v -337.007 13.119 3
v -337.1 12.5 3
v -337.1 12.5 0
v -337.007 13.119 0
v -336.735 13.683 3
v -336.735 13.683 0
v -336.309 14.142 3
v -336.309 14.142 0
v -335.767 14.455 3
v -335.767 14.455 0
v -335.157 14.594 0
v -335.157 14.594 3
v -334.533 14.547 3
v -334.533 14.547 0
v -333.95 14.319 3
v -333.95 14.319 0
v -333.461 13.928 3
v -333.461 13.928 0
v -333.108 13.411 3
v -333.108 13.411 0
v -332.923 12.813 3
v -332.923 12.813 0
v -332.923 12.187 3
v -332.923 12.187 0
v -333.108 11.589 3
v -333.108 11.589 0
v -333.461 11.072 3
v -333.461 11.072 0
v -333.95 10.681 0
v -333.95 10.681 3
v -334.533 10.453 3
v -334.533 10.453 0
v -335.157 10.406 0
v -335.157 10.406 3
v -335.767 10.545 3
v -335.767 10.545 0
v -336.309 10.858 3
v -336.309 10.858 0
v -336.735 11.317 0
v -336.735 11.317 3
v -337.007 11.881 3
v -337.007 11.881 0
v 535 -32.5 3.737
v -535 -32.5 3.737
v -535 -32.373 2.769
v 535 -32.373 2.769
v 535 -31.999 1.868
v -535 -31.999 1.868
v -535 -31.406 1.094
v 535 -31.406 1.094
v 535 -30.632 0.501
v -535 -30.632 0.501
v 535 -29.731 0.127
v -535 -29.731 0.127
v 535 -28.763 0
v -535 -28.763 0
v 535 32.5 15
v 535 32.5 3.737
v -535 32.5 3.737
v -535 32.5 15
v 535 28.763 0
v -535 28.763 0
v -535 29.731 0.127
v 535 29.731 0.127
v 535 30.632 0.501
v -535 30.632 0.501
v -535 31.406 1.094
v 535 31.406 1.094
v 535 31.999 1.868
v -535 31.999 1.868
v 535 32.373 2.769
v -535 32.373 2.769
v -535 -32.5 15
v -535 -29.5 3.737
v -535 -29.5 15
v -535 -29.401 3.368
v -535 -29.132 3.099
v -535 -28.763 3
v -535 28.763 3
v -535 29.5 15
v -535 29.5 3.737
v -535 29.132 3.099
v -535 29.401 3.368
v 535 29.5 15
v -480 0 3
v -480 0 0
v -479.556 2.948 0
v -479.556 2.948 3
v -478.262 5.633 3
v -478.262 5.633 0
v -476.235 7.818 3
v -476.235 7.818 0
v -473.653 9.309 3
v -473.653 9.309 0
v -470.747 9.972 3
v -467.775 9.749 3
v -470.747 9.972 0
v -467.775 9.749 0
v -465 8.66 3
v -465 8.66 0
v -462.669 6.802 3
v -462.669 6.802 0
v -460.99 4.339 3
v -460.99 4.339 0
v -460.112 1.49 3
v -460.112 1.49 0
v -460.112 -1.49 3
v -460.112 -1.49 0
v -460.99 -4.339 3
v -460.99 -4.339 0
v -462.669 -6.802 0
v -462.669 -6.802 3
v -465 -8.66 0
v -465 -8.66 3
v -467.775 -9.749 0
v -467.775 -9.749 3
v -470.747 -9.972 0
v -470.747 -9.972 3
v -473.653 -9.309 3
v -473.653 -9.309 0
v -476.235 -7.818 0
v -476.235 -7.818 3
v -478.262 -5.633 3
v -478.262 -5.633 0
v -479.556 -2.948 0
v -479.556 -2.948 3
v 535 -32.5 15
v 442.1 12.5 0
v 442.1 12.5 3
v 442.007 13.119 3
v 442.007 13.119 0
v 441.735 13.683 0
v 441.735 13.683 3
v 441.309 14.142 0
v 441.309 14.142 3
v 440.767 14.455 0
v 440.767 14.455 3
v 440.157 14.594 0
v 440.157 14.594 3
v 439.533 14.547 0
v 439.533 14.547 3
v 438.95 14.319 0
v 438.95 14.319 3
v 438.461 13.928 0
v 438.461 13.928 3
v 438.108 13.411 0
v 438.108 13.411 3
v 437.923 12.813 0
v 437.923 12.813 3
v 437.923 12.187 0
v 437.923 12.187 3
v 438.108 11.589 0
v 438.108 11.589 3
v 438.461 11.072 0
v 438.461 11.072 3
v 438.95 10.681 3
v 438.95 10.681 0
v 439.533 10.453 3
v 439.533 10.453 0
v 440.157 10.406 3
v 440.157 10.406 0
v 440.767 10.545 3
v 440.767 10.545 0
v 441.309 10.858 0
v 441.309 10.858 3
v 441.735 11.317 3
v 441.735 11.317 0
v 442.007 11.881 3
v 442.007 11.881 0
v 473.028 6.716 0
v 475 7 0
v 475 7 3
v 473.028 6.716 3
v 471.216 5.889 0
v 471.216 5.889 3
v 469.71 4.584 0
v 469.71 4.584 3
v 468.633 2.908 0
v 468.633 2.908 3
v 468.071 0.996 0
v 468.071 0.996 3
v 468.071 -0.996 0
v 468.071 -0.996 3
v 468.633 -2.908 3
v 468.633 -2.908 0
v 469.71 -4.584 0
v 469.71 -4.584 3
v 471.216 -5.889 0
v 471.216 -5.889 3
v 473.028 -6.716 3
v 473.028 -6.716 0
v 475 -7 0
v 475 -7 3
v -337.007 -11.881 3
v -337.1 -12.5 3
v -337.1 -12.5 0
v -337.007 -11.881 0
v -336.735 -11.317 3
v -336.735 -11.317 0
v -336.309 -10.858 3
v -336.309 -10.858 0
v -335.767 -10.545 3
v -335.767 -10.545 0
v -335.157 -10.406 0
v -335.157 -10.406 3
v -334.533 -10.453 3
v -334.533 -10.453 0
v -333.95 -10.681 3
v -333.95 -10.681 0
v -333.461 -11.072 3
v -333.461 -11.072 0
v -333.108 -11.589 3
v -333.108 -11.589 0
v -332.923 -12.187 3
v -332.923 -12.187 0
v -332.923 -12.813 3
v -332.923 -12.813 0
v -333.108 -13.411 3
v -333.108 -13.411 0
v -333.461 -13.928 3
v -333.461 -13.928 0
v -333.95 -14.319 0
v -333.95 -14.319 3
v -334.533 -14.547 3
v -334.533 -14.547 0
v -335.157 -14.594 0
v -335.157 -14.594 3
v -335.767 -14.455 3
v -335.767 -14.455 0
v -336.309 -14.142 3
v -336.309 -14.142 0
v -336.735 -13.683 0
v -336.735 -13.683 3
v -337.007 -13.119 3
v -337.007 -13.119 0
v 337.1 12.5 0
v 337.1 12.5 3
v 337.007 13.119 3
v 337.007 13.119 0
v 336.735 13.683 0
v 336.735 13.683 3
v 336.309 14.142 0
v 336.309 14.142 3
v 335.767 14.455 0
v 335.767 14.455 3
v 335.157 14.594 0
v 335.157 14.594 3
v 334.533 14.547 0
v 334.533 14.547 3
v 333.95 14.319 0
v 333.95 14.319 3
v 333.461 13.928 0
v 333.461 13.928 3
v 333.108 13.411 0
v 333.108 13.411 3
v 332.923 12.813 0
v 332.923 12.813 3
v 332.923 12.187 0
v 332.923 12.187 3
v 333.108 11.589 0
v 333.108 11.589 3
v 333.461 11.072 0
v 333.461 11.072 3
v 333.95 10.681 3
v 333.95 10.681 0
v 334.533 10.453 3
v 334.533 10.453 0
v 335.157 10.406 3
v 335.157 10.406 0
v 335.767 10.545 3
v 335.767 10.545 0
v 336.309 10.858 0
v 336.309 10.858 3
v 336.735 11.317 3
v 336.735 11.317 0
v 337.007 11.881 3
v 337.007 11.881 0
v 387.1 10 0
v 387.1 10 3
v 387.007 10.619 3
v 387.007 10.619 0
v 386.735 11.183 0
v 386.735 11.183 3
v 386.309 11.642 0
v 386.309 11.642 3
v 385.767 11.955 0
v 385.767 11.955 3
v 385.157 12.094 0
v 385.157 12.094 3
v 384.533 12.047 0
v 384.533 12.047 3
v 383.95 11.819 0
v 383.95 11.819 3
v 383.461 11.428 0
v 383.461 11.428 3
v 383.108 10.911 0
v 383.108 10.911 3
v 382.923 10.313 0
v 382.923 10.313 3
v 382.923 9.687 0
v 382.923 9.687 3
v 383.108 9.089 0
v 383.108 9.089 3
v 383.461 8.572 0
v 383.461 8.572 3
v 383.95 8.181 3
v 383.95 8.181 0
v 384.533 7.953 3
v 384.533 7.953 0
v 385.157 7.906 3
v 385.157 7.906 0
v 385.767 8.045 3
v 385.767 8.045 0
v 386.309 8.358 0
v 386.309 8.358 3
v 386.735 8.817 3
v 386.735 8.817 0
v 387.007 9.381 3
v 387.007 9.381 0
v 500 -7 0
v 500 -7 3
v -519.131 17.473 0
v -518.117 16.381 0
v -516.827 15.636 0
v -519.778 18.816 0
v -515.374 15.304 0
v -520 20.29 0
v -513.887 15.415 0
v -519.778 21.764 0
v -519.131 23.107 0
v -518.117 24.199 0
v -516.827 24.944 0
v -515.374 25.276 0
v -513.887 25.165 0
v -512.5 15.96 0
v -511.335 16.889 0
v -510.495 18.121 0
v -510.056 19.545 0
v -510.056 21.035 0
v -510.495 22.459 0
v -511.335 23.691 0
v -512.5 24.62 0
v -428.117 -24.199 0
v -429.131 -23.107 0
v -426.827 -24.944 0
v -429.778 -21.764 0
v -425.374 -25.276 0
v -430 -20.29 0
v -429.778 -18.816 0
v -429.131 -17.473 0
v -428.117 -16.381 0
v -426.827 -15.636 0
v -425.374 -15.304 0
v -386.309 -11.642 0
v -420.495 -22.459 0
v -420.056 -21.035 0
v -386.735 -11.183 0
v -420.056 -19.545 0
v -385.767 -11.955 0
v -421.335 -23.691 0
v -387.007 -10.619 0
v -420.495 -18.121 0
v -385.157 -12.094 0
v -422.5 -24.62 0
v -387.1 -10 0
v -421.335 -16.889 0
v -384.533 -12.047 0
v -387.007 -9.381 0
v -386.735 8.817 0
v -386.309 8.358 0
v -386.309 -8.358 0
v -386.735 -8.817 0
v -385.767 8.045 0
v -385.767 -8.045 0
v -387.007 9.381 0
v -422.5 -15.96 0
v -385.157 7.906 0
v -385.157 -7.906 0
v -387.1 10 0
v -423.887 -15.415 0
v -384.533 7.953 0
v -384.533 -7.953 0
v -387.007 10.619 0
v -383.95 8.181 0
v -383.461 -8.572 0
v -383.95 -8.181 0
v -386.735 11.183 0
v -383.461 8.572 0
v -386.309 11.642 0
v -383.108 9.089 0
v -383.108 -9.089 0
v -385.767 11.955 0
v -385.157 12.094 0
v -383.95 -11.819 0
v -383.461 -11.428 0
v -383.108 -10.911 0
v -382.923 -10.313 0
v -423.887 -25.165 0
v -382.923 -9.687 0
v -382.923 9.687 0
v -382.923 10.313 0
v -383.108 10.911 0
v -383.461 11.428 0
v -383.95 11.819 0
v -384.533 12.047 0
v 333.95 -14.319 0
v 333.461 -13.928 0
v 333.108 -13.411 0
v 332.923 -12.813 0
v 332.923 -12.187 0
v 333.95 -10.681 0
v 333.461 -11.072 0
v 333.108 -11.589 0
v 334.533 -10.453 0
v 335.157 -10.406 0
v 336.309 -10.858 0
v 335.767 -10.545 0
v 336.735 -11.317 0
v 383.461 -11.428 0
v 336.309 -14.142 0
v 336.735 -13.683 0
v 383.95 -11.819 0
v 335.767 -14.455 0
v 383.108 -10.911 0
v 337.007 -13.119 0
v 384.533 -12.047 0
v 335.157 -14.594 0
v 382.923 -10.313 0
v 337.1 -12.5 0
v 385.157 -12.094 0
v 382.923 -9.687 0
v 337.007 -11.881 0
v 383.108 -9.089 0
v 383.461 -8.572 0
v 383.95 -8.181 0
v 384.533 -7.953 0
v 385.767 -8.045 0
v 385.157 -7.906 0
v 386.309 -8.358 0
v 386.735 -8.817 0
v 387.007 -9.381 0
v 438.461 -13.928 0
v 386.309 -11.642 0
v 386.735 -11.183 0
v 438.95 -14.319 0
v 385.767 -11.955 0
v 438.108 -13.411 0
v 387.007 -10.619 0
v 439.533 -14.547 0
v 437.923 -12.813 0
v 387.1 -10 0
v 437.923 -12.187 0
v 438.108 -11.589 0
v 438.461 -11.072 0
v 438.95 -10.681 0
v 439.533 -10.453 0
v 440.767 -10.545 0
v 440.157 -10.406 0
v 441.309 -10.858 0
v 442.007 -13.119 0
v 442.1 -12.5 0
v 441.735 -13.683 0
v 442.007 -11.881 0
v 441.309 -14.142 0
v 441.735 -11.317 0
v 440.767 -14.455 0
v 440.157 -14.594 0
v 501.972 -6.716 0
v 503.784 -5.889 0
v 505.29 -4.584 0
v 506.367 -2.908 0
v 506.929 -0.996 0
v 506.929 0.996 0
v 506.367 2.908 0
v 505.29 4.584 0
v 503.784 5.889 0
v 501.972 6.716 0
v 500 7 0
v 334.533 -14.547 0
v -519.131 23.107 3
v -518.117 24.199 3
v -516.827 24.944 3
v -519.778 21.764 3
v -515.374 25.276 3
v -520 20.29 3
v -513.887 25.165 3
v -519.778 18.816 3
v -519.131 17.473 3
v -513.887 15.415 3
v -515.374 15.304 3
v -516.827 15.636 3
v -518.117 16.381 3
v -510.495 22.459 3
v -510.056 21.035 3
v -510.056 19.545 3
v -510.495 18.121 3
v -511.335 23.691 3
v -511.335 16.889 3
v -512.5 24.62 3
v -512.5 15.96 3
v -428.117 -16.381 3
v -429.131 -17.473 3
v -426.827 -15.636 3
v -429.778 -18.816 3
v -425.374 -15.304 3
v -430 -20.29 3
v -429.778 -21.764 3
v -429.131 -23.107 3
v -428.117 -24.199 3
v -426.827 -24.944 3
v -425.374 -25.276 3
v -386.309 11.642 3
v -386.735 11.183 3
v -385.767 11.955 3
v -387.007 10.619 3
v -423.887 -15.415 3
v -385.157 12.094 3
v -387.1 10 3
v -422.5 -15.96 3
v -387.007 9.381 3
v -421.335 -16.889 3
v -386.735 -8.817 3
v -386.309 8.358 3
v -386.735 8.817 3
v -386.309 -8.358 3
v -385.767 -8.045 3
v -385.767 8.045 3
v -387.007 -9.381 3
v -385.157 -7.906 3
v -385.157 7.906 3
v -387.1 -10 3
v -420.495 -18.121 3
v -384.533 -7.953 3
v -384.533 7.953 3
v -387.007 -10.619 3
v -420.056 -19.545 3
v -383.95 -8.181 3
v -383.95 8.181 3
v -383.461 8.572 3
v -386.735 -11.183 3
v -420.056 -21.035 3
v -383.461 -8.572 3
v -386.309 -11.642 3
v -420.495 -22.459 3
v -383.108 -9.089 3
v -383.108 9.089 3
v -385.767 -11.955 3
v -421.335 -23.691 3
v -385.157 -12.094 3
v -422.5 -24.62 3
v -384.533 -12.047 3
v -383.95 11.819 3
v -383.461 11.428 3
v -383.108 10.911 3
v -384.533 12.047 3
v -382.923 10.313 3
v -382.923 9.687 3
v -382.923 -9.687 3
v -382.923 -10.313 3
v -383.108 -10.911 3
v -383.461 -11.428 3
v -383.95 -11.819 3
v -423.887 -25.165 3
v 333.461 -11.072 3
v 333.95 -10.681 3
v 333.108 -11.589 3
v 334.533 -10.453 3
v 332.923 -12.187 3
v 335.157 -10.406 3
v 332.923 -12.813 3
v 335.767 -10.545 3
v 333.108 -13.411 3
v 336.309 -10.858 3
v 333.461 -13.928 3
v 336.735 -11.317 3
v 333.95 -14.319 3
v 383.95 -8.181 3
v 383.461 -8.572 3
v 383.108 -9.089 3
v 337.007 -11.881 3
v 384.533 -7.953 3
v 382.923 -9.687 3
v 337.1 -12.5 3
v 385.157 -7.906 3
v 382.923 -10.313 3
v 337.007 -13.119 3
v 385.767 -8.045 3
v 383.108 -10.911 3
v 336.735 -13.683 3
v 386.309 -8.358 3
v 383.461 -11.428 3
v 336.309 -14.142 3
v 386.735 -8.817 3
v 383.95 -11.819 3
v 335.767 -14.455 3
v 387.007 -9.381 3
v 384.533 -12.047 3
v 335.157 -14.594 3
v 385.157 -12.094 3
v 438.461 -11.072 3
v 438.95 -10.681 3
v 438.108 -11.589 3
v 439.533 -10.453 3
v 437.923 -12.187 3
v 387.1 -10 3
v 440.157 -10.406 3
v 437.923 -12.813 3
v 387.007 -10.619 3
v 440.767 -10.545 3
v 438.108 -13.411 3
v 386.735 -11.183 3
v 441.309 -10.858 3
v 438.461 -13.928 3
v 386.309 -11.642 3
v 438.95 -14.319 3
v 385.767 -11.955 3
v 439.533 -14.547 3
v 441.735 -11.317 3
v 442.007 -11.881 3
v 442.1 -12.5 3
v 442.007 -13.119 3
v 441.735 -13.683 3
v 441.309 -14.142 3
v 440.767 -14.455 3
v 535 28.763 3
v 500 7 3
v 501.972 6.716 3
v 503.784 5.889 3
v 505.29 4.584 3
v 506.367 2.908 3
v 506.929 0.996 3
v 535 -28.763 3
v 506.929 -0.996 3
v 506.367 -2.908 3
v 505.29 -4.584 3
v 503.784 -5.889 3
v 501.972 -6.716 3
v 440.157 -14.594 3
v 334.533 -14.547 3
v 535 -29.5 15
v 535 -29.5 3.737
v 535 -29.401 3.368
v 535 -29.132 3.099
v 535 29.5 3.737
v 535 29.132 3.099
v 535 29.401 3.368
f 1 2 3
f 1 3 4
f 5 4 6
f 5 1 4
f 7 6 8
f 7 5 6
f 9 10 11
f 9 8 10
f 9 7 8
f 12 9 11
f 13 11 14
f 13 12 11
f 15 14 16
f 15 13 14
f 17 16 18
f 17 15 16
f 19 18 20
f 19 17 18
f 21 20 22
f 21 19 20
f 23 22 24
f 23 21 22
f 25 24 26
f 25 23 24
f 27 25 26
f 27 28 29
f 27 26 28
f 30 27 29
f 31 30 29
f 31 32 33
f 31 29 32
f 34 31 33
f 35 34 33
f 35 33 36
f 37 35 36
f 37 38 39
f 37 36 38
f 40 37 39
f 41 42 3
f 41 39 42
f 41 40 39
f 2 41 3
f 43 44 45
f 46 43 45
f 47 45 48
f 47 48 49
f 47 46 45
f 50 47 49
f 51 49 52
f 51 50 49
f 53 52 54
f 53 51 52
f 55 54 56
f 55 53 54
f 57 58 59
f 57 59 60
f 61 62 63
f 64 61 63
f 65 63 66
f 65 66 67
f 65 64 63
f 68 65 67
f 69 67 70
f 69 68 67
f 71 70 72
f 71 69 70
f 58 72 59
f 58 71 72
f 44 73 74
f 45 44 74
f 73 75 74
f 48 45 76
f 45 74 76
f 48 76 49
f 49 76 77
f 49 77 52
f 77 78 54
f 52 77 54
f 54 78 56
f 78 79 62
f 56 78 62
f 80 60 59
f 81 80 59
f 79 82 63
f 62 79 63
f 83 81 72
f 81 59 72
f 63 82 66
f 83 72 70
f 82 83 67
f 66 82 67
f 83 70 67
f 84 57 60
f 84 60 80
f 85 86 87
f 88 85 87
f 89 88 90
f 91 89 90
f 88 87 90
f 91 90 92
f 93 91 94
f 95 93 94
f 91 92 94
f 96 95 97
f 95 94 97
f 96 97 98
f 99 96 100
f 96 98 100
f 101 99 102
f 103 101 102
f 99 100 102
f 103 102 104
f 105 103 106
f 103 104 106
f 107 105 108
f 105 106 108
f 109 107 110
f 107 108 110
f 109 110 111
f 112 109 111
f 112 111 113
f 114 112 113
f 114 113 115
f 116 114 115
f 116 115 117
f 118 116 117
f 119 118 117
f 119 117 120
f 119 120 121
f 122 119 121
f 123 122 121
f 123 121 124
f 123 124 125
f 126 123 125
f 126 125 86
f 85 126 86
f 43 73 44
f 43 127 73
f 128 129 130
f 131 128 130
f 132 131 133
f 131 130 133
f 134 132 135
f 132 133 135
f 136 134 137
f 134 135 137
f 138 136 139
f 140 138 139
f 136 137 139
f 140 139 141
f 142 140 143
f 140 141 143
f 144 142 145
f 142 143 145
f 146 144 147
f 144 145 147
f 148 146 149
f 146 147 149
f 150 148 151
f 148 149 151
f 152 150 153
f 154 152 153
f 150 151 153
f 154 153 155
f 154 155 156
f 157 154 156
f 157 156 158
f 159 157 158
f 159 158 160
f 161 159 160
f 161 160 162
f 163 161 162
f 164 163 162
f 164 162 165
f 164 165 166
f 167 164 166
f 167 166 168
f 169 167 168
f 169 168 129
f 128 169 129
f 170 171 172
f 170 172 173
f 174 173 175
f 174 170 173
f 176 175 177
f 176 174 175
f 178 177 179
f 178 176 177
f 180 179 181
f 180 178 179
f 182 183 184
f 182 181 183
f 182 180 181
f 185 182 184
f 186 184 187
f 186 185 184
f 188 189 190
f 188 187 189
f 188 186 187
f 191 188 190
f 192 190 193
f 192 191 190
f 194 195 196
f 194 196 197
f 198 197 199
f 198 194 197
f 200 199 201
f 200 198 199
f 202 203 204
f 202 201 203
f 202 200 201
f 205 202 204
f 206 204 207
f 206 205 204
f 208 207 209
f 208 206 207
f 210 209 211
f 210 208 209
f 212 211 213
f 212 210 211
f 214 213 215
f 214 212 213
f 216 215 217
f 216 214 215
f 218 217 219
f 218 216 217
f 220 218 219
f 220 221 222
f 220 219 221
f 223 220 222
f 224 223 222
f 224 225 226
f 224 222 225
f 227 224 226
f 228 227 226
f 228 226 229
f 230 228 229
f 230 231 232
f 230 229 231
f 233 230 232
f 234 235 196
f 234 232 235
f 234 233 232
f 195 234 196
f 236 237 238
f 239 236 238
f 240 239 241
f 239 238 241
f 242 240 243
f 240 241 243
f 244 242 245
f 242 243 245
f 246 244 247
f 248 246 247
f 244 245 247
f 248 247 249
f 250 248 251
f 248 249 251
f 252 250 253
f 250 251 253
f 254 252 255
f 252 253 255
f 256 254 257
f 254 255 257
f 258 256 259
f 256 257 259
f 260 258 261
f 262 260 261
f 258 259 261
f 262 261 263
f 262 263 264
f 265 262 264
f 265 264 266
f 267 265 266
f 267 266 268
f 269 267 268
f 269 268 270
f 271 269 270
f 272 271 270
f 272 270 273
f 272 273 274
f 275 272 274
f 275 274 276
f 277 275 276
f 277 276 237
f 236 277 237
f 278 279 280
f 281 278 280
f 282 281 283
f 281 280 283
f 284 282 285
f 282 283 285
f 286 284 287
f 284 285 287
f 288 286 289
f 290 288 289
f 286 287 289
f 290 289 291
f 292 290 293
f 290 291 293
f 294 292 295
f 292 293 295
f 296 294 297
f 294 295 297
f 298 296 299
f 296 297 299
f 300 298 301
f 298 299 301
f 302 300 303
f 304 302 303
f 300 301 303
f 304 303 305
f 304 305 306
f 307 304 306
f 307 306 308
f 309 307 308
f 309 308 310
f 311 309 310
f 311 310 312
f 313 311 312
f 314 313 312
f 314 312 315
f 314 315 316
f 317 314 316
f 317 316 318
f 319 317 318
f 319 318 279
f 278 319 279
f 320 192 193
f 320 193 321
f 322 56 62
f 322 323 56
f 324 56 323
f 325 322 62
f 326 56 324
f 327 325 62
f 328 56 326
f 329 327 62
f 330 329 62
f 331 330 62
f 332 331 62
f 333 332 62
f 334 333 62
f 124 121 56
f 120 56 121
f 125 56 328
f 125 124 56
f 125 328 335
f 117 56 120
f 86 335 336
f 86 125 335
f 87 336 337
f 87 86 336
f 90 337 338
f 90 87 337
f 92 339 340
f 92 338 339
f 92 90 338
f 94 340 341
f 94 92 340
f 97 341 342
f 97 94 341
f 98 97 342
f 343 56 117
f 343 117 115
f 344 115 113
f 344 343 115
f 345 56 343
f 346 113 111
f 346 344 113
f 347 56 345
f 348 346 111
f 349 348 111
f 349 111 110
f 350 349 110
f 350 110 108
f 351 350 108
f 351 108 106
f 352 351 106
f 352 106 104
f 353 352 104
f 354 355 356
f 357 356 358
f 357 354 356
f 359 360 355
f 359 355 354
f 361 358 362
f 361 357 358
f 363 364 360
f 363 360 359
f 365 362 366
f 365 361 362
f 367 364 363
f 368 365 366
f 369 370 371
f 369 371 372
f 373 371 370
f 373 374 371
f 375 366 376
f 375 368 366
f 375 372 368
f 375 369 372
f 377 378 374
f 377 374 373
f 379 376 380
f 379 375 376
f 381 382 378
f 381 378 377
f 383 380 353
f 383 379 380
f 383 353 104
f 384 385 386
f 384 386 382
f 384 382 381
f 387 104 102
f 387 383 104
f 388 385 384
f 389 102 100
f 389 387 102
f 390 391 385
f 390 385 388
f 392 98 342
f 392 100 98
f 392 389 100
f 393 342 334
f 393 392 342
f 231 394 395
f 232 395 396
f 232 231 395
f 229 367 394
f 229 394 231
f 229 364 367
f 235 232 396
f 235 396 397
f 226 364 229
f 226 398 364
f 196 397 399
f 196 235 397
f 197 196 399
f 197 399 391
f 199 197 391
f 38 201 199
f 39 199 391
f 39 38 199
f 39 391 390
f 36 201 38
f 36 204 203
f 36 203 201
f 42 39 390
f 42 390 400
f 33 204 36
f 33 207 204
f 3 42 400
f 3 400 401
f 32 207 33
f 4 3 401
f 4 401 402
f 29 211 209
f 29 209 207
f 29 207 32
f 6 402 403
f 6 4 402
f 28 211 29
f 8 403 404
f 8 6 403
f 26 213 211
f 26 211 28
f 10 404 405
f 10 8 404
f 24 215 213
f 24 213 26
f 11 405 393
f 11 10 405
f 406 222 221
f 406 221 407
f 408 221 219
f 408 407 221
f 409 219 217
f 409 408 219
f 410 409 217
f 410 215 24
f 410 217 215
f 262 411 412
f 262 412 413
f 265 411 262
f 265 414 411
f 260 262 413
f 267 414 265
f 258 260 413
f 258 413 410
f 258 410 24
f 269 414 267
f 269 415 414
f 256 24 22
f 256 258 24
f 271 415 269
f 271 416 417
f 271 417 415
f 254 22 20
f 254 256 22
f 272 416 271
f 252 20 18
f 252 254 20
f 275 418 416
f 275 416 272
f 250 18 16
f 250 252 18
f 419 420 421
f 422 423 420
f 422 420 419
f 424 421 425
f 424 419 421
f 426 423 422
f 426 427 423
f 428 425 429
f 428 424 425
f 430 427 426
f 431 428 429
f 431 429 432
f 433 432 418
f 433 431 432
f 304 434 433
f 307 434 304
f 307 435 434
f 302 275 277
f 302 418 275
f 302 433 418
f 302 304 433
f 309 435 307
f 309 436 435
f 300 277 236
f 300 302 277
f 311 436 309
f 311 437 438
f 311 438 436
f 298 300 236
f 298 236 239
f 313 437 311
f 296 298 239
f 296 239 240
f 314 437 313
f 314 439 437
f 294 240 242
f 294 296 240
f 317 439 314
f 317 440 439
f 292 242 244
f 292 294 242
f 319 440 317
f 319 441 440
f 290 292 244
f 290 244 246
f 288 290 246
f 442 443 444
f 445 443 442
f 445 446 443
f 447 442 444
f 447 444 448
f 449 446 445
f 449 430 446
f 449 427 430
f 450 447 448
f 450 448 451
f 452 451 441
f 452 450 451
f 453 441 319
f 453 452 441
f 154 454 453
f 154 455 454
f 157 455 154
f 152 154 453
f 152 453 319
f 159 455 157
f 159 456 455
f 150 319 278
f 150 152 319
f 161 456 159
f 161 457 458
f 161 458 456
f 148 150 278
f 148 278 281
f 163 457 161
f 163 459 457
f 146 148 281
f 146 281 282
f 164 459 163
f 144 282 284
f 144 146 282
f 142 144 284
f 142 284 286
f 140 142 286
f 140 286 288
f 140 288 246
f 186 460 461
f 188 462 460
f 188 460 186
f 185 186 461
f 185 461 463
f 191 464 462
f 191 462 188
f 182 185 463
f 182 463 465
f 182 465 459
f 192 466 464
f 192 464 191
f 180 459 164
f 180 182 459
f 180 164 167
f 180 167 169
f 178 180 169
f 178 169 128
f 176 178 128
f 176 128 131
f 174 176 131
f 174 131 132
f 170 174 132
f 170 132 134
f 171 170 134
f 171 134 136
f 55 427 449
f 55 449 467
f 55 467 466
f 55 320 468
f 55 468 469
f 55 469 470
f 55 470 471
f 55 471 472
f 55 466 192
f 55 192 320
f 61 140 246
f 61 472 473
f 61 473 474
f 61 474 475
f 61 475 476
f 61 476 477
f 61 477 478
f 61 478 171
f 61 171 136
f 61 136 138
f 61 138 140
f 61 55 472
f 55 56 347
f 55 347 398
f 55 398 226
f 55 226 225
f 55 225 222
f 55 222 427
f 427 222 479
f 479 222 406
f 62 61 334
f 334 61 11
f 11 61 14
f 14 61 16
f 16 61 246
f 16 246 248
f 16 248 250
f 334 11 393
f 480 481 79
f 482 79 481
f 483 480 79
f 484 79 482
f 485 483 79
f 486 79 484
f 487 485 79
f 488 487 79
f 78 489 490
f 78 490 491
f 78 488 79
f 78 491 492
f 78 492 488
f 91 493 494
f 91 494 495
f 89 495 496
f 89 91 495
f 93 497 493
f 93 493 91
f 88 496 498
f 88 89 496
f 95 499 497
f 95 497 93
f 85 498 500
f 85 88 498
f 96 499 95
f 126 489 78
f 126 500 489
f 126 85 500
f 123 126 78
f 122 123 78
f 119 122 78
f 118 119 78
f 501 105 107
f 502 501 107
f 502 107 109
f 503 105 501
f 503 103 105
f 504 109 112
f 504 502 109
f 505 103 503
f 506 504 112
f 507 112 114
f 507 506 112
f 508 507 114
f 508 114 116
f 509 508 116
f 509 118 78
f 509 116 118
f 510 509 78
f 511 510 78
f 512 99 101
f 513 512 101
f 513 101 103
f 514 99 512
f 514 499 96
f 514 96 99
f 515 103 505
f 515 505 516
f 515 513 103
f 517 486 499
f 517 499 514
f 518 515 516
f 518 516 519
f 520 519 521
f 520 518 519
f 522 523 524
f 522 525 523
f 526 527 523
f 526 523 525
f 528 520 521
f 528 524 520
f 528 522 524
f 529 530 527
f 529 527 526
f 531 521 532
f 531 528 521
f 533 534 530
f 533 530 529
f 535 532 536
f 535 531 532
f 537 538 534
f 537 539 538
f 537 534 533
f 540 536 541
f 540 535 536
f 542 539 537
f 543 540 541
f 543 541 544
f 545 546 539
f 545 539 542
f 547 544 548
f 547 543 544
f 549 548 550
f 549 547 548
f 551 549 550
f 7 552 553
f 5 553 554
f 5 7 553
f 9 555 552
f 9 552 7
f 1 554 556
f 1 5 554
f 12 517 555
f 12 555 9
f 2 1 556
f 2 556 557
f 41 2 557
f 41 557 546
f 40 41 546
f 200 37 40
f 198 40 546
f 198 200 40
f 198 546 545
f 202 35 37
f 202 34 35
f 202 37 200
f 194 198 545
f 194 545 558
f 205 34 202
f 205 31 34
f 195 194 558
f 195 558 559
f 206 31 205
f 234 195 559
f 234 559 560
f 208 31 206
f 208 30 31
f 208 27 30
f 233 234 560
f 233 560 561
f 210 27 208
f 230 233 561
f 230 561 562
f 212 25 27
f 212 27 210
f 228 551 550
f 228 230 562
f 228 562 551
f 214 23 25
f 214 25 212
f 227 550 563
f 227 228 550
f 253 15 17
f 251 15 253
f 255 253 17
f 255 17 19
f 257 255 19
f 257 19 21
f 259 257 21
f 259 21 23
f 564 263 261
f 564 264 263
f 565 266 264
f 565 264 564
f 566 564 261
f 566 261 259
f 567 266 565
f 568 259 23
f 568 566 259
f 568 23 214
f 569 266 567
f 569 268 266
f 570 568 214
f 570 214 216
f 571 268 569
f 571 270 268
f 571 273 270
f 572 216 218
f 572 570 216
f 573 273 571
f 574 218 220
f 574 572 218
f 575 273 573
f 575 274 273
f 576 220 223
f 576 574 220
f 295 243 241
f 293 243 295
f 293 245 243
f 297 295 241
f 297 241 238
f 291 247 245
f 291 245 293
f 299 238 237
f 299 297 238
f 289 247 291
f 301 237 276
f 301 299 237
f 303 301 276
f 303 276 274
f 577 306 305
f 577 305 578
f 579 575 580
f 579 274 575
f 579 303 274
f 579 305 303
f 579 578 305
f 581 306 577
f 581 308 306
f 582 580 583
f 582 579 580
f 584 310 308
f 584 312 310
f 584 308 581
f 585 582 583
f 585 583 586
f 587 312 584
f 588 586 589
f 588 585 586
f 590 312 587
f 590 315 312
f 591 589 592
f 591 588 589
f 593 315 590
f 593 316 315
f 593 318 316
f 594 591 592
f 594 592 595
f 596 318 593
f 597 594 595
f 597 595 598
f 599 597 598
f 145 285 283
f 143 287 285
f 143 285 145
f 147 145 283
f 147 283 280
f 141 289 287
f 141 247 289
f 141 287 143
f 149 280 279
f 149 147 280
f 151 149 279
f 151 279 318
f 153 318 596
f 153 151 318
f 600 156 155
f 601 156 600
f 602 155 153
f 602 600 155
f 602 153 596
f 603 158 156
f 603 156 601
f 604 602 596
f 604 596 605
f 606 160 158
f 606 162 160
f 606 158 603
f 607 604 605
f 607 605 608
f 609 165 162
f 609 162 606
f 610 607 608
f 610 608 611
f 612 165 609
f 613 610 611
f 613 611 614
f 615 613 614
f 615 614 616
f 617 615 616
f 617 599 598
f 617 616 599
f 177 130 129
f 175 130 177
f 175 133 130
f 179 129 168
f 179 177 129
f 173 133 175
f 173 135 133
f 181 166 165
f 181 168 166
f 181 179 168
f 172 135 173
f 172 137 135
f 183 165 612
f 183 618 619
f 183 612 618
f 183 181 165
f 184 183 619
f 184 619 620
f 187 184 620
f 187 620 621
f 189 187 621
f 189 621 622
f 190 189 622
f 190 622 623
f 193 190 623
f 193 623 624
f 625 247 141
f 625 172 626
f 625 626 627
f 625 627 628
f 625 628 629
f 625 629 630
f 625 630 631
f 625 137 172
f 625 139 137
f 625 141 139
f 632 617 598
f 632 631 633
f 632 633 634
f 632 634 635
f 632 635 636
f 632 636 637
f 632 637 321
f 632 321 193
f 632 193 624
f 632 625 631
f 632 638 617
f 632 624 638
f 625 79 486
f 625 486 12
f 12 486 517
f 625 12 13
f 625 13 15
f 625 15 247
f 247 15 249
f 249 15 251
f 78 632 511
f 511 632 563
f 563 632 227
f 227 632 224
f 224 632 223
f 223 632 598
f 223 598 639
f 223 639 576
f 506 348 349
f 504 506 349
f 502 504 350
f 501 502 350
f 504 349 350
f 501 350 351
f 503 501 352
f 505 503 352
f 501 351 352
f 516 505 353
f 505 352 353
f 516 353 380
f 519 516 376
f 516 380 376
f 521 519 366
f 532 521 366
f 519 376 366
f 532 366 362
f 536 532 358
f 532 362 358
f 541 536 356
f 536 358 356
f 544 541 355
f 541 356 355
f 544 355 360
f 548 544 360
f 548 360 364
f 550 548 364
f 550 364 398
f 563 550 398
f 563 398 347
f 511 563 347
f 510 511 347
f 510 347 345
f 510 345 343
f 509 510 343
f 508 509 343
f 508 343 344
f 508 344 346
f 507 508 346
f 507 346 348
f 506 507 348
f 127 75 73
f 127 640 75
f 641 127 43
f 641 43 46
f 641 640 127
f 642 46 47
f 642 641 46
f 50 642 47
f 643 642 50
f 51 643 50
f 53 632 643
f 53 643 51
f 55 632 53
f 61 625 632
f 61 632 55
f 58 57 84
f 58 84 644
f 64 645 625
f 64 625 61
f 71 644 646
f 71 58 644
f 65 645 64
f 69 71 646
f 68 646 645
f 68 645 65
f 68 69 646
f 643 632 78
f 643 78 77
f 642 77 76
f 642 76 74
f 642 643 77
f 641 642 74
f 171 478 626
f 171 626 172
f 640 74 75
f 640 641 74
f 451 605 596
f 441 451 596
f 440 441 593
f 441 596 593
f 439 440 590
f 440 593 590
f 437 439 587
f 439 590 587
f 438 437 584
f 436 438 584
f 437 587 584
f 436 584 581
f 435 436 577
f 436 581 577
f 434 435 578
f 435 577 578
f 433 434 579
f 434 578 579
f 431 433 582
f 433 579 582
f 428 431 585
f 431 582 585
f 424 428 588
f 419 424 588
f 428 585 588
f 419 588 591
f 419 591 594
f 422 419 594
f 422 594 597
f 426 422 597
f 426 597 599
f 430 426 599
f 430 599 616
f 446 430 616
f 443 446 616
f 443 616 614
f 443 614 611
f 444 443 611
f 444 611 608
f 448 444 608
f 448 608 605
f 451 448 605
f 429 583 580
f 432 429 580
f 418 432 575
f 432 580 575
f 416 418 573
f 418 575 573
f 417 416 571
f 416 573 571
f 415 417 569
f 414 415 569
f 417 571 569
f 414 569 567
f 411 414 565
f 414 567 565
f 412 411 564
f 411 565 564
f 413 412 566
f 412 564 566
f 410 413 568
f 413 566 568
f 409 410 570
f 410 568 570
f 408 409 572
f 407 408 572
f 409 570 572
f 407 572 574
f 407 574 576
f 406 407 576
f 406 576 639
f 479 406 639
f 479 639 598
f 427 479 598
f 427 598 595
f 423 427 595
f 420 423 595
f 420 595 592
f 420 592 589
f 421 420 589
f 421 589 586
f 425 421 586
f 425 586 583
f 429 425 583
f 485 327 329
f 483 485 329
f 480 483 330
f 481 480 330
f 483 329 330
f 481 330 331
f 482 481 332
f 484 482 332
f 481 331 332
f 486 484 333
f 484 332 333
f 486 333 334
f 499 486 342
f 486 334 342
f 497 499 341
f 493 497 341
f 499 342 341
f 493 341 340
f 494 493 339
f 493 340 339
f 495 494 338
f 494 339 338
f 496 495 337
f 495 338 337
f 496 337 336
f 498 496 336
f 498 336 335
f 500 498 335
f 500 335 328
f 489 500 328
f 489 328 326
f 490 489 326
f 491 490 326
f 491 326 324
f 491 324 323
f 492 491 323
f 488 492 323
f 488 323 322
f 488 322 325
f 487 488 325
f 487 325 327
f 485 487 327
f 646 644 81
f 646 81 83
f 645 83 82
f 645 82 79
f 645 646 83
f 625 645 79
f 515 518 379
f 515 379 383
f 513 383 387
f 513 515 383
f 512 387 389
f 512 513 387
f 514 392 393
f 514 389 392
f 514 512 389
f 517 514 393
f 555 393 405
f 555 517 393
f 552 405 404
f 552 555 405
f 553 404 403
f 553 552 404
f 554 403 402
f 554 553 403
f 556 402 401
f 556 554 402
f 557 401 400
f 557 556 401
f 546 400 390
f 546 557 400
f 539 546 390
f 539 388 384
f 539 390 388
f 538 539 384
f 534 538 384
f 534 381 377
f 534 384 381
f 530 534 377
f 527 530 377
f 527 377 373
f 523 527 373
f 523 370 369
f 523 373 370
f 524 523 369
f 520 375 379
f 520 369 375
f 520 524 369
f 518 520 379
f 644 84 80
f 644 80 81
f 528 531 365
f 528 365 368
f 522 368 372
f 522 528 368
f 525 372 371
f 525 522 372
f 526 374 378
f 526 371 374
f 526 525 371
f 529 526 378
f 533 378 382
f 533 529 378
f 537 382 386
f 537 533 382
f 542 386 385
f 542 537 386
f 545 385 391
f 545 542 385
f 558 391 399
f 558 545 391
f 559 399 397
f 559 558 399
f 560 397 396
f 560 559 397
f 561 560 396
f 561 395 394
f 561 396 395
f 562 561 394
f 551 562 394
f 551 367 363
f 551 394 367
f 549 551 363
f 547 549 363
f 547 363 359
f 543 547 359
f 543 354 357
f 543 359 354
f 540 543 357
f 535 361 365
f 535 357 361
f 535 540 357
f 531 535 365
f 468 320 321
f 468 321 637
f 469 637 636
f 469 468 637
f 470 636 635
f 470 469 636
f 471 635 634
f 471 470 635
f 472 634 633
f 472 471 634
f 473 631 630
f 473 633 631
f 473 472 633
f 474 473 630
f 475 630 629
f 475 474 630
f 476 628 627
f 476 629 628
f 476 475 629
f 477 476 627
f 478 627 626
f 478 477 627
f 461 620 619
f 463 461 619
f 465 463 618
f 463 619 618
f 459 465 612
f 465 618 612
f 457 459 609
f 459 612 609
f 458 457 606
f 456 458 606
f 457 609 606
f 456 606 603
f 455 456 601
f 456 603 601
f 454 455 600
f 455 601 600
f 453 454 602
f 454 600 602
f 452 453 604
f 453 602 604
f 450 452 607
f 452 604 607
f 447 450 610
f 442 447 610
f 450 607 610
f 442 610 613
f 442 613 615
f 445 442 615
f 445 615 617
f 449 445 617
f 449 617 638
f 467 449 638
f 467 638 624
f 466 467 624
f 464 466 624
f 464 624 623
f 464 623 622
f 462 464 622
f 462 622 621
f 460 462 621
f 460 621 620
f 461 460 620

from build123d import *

# Parameters (mm, degrees)
TABAN_FLAN_1_DEPTH    = 535
KES_EKSTR_ZYON1_DEPTH = 10
M5_DI_LI_DELIK1_D     = 4.2
M5_DI_LI_DELIK2_D     = 4.2
M5_DI_LI_DELIK3_D     = 4.2
IZIM13_R              = 10
IZIM13_R_2            = 5
KES_EKSTR_ZYON2_DEPTH = 10


# Sheet-metal steps are written as plain solids
with BuildPart() as part:
    # Çizim1 → Taban-Flanş1 (new, symmetric)
    with BuildSketch(Plane(origin=(0, 0, 0), x_dir=(0, 0, -1), z_dir=(1, 0, 0))):
        with BuildLine():
            Line((-15, -32.5), (-3.7366, -32.5))
            ThreePointArc((-3.7366, -32.5), (-1.094424801, -31.405575199), (0, -28.7634))
            Line((0, -28.7634), (0, 28.7634))
            ThreePointArc((0, 28.7634), (-1.094424801, 31.405575199), (-3.7366, 32.5))
            Line((-3.7366, 32.5), (-15, 32.5))
            Line((-15, 32.5), (-15, 29.5))
            Line((-15, 29.5), (-3.7366, 29.5))
            ThreePointArc((-3.7366, 29.5), (-3.215745145, 29.284254855), (-3, 28.7634))
            Line((-3, 28.7634), (-3, -28.7634))
            ThreePointArc((-3, -28.7634), (-3.215745145, -29.284254855), (-3.7366, -29.5))
            Line((-3.7366, -29.5), (-15, -29.5))
            Line((-15, -29.5), (-15, -32.5))
        make_face()
    extrude(amount=TABAN_FLAN_1_DEPTH, both=True)

    # Çizim6 → Kes-Ekstrüzyon1 (cut)
    with BuildSketch(Plane(origin=(0, 0, 0), x_dir=(-1, 0, 0), z_dir=(0, 0, -1))):
        with BuildLine():
            Line((-500, 7), (-475, 7))
            ThreePointArc((-475, 7), (-468, 0), (-475, -7))
            Line((-475, -7), (-500, -7))
            ThreePointArc((-500, -7), (-507, 0), (-500, 7))
        make_face()
    extrude(amount=-KES_EKSTR_ZYON1_DEPTH, mode=Mode.SUBTRACT)

    # M5 Dişli Delik1 (through all)
    with Locations(Plane(origin=(440, 12.5, 0), x_dir=(-1, 0, 0), z_dir=(0, 0, -1))):
        with Locations((0, 0), (0, -25)):
            Hole(M5_DI_LI_DELIK1_D / 2)

    # M5 Dişli Delik2 (through all)
    with Locations(Plane(origin=(385, 10, 0), x_dir=(-1, 0, 0), z_dir=(0, 0, -1))):
        with Locations((0, 0), (0, -20)):
            m5_di_li_delik2 = Hole(M5_DI_LI_DELIK2_D / 2)

    # M5 Dişli Delik3 (through all)
    with Locations(Plane(origin=(335, 12.5, 0), x_dir=(-1, 0, 0), z_dir=(0, 0, -1))):
        with Locations((0, 0), (0, -25)):
            m5_di_li_delik3 = Hole(M5_DI_LI_DELIK3_D / 2)

    # Aynalama1: M5 Dişli Delik2, M5 Dişli Delik3 across plane
    add(m5_di_li_delik2.mirror(Plane(origin=(0, 0, 0), x_dir=(0, 0, 1), z_dir=(1, 0, 0))), mode=Mode.SUBTRACT)
    add(m5_di_li_delik3.mirror(Plane(origin=(0, 0, 0), x_dir=(0, 0, 1), z_dir=(1, 0, 0))), mode=Mode.SUBTRACT)

    # Çizim13 → Kes-Ekstrüzyon2 (cut)
    with BuildSketch(Plane(origin=(0, 0, 0), x_dir=(-1, 0, 0), z_dir=(0, 0, -1))):
        with Locations((470, 0)):
            Circle(IZIM13_R)
        with Locations((515, 20.289920322)):
            Circle(IZIM13_R_2)
        with Locations((425, -20.289920322)):
            Circle(IZIM13_R_2)
    extrude(amount=-KES_EKSTR_ZYON2_DEPTH, mode=Mode.SUBTRACT)


solid = part.part
